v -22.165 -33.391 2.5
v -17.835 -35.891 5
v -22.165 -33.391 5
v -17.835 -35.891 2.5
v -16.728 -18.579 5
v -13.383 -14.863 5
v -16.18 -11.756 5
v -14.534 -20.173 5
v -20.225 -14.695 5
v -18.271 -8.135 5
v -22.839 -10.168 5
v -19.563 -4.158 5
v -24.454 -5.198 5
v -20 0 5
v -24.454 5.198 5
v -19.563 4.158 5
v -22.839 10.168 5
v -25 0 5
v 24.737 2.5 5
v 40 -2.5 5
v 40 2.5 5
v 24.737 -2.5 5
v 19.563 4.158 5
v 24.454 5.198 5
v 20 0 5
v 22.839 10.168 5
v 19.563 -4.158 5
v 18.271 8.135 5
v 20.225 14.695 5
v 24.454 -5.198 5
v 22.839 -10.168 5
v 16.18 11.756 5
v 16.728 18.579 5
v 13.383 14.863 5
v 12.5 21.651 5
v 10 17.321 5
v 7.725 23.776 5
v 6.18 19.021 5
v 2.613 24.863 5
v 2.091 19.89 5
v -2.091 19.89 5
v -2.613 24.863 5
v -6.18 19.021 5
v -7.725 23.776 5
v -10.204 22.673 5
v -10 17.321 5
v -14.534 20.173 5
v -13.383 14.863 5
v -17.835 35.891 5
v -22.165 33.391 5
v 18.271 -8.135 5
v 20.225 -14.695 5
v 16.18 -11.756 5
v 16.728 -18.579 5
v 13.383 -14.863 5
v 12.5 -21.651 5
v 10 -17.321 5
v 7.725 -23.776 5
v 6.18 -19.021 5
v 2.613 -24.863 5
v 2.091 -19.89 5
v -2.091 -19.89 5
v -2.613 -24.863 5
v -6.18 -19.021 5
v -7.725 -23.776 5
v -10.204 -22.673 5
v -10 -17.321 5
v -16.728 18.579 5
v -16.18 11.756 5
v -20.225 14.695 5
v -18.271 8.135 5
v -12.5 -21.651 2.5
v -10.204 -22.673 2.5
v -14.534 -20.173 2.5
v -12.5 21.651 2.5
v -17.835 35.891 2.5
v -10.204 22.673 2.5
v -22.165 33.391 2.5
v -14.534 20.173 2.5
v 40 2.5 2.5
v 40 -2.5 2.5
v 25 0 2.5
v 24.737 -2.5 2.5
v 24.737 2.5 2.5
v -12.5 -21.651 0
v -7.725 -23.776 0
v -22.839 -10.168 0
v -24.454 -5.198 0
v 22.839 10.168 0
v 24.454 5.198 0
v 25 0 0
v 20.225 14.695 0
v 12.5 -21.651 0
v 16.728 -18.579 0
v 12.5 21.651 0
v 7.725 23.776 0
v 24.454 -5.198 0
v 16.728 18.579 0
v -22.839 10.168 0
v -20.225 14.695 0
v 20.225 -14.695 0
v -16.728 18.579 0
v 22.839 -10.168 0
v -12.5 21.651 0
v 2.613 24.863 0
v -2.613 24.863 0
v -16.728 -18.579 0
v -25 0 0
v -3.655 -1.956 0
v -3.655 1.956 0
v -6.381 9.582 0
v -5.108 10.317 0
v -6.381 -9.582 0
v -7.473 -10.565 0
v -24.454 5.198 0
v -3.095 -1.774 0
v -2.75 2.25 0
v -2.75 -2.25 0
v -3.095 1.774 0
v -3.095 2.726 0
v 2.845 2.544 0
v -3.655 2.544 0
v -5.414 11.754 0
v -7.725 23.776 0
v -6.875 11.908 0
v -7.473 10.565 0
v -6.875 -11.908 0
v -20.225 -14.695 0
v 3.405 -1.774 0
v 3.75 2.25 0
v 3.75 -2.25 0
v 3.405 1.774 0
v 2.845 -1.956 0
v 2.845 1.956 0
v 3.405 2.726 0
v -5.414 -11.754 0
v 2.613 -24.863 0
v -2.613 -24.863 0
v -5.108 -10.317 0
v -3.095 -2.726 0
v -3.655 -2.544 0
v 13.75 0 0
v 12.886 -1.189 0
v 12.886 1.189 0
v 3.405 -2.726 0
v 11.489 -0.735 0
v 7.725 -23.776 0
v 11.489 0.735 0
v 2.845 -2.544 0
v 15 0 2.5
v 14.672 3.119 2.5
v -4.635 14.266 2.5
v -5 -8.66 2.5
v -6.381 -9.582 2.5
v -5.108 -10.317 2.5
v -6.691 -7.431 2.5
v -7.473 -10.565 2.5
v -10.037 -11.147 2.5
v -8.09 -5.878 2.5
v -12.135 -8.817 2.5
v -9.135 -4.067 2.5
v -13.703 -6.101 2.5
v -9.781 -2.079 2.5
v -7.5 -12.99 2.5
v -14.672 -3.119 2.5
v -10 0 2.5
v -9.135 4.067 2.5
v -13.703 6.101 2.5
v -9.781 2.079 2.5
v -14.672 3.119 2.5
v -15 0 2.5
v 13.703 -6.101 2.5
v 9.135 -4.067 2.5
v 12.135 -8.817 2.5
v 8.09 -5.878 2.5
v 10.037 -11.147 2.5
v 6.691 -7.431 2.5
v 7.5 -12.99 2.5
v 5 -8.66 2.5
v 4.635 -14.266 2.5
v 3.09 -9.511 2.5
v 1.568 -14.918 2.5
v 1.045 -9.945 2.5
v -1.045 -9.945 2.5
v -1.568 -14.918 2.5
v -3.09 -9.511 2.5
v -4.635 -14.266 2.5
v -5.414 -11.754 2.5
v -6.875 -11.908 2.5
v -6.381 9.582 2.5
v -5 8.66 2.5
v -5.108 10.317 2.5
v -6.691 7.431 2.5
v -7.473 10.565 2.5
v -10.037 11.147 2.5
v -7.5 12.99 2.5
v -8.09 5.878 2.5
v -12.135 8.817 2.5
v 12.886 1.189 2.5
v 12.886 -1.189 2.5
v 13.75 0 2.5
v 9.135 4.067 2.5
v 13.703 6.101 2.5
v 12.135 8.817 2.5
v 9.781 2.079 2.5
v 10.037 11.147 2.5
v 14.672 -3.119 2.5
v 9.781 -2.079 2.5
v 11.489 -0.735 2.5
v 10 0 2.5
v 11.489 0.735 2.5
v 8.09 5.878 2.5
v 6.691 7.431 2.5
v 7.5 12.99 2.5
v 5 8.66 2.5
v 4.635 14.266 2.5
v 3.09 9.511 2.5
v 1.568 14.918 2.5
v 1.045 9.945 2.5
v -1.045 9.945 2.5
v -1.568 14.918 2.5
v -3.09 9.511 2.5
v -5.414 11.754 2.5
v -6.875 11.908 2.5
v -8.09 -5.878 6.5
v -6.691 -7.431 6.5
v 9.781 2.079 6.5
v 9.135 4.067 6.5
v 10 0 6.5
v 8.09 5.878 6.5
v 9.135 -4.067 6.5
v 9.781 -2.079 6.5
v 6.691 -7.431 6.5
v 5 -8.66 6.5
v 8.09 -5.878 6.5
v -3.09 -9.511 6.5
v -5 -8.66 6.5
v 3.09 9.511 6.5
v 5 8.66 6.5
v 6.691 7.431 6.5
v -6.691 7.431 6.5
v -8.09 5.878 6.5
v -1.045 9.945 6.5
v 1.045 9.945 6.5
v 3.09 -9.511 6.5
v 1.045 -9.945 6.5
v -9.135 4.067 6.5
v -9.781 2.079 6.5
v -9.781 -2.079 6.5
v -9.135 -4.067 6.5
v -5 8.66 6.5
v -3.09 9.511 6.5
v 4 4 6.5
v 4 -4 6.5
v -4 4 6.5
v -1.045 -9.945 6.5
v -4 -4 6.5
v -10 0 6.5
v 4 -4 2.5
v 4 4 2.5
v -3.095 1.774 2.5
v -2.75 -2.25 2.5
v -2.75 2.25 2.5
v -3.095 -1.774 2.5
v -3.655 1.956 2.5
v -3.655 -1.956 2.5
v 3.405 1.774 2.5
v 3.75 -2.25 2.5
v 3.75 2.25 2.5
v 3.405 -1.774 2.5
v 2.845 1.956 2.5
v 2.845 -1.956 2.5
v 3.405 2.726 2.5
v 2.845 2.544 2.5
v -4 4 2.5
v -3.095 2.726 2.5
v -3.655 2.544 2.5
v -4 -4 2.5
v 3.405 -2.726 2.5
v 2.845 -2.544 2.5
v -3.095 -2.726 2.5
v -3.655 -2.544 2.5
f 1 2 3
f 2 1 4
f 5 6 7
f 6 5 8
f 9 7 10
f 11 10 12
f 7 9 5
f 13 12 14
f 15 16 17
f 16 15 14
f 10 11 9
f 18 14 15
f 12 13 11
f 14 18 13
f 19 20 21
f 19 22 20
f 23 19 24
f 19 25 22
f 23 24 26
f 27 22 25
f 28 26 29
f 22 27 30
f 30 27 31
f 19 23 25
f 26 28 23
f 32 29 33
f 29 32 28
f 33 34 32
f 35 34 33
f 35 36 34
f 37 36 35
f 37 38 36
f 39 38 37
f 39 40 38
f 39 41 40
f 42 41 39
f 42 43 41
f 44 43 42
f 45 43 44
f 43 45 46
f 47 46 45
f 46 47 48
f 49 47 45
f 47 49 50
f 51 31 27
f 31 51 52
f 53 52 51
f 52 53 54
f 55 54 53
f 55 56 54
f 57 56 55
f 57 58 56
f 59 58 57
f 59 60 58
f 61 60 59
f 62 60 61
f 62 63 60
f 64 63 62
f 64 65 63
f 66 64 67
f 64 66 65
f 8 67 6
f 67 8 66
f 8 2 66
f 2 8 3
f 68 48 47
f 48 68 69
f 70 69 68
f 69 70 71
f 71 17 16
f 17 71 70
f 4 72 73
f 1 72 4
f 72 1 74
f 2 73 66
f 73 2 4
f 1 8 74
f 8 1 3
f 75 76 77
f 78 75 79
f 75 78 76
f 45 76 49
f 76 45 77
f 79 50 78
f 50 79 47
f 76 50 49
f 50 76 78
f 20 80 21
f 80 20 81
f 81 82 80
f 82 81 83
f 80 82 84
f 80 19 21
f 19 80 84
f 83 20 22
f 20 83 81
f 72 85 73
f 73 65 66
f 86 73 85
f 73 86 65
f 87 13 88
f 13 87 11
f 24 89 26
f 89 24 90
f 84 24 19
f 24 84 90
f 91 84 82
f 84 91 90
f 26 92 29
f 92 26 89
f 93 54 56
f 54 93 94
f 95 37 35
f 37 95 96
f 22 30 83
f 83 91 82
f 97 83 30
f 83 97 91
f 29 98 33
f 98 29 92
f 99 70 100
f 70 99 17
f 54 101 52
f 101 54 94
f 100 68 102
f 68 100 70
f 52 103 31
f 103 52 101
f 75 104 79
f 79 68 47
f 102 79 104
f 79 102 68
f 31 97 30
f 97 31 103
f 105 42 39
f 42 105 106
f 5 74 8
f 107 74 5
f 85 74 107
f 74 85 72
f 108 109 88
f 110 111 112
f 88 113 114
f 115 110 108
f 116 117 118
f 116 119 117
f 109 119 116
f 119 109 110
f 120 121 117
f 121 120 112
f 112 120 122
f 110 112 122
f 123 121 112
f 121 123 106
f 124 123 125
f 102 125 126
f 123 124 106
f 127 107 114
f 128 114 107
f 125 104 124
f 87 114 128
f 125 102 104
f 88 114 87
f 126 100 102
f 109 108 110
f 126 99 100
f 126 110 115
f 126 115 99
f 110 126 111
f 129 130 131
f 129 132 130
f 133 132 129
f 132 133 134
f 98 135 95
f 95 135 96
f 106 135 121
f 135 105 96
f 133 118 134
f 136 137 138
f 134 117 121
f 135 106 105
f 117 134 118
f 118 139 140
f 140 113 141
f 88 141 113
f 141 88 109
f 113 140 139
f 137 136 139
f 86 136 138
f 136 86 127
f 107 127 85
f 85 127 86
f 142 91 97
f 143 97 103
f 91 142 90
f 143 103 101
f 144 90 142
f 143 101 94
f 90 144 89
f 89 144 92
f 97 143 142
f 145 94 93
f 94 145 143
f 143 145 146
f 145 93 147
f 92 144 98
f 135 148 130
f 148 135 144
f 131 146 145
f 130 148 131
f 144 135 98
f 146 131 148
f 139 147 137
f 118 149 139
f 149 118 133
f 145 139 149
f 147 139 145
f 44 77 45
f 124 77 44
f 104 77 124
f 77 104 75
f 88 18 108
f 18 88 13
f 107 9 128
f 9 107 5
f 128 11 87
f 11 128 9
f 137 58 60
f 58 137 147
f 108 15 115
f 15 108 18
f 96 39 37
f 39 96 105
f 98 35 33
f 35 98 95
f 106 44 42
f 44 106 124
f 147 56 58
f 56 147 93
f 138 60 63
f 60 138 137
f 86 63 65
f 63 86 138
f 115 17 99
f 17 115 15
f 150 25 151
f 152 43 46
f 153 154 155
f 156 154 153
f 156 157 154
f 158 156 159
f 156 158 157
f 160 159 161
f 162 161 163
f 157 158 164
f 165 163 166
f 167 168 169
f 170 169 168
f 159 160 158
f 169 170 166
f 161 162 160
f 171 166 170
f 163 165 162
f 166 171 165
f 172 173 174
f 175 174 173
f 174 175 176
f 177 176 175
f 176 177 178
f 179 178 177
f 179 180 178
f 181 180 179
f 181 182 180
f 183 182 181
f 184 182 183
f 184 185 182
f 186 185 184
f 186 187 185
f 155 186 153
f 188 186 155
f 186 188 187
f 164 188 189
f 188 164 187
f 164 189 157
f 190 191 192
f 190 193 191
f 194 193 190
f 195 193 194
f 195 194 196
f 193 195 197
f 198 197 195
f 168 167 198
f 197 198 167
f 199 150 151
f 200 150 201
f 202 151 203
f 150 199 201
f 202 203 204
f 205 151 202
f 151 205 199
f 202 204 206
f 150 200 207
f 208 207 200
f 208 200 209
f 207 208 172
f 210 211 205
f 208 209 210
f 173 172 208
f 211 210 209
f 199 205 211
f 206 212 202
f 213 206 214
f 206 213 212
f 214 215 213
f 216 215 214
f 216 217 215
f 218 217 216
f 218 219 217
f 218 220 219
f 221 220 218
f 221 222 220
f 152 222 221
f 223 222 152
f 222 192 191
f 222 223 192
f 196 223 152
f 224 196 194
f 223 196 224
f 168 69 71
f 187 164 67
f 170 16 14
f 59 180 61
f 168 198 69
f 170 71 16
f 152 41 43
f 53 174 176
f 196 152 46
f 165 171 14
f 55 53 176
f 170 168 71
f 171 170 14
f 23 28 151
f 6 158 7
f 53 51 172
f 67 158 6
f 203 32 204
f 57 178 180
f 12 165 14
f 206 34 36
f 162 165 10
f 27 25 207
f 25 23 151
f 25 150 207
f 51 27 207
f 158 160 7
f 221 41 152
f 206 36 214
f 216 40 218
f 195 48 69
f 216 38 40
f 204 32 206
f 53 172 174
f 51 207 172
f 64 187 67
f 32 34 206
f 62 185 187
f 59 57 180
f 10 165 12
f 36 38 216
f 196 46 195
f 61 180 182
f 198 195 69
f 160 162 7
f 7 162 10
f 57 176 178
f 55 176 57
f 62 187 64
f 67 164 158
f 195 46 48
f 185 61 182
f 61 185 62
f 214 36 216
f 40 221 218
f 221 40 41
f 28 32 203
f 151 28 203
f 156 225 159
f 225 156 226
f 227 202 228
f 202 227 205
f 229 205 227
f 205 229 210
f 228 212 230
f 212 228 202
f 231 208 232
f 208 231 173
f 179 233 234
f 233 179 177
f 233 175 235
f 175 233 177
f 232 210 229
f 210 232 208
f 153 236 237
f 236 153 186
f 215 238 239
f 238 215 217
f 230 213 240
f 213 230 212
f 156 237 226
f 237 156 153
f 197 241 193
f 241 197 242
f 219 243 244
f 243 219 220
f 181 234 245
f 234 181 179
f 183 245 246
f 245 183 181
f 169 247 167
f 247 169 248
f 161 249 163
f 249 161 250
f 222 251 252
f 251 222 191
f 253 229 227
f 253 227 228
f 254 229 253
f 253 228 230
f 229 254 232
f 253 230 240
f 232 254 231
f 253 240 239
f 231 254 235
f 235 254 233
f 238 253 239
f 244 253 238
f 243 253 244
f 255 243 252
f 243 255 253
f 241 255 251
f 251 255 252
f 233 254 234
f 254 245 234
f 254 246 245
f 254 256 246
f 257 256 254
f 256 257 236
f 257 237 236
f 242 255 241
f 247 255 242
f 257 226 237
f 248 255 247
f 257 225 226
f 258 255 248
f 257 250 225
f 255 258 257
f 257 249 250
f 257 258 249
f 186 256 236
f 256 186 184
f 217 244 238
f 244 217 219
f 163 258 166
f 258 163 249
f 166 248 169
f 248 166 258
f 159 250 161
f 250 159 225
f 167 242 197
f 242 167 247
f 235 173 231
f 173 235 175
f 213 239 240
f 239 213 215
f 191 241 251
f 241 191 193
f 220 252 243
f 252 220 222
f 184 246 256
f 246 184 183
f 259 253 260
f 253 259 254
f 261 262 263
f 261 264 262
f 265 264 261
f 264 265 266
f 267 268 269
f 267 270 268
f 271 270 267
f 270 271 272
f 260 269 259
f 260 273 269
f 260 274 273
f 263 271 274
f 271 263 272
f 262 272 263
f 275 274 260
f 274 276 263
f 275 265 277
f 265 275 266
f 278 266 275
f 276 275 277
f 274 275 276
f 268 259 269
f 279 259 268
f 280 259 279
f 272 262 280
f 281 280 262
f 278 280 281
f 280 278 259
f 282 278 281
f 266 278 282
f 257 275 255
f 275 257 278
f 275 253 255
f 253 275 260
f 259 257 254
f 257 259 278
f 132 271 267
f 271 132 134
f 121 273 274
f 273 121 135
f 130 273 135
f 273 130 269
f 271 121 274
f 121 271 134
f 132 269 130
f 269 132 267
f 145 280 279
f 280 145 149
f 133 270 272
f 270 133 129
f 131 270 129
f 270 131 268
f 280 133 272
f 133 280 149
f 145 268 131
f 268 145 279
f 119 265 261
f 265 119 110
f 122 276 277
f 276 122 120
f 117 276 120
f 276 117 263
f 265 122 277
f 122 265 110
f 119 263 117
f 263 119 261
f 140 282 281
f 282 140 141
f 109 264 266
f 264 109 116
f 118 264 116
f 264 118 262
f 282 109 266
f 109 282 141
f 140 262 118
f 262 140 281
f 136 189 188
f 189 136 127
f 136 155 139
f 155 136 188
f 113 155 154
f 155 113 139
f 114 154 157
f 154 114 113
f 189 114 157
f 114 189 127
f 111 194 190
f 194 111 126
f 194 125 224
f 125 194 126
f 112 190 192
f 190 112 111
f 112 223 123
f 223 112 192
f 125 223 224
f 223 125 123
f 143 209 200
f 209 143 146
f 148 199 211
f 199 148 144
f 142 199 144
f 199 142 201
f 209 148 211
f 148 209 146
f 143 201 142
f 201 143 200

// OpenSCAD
Base_Height=2.5;
Base_Radius=25;
Wing_Height=2.5;
Wing_Length=20;
Wing_Width=5;
Sensor_Width=8;
Sensor_Height=4;

Top_Inner_Radius=20;
Bot_Inner_Radius=15;
Sensor_Area_Radius=10;

Sensor_Hole_X=3.25;
Sensor_Hole_Y=2.25;
Sensor_Hole_R=.5;

Wire_Hole_R=1.25;

difference(){

difference(){

union(){

difference(){

union(){

rotate([0,0,240])translate([Base_Radius-Wing_Width,-Wing_Width/2,Base_Height])cube([Wing_Length,Wing_Width,Wing_Height]);

rotate([0,0,120])translate([Base_Radius-Wing_Width,-Wing_Width/2,Base_Height])cube([Wing_Length,Wing_Width,Wing_Height]);

translate([Base_Radius-Wing_Width,-Wing_Width/2,Base_Height])cube([Wing_Length,Wing_Width,Wing_Height]);

cylinder(Base_Height+Wing_Height,Base_Radius,Base_Radius);

}

union(){

translate([0,0,Base_Height])cylinder(Wing_Height,Bot_Inner_Radius,Top_Inner_Radius);

translate([0,0,Base_Height+Wing_Height])cylinder(1,Top_Inner_Radius,Top_Inner_Radius);

}

}

translate([0,0,Base_Height])cylinder(Sensor_Height,Sensor_Area_Radius,Sensor_Area_Radius);

}

translate([-Sensor_Width/2,-Sensor_Width/2,Base_Height])cube([Sensor_Width,Sensor_Width,Sensor_Height+1]);

}

union(){

translate([Sensor_Hole_X,Sensor_Hole_Y,-1])cylinder(Base_Height+2,Sensor_Hole_R,Sensor_Hole_R);

translate([Sensor_Hole_X,-Sensor_Hole_Y,-1])cylinder(Base_Height+2,Sensor_Hole_R,Sensor_Hole_R);

translate([-Sensor_Hole_X,Sensor_Hole_Y,-1])cylinder(Base_Height+2,Sensor_Hole_R,Sensor_Hole_R);

translate([-Sensor_Hole_X,-Sensor_Hole_Y,-1])cylinder(Base_Height+2,Sensor_Hole_R,Sensor_Hole_R);

rotate([0,0,240])translate([Bot_Inner_Radius/2+Sensor_Area_Radius/2,0,-1])cylinder(Base_Height+2,Wire_Hole_R,Wire_Hole_R);

rotate([0,0,120])translate([Bot_Inner_Radius/2+Sensor_Area_Radius/2,0,-1])cylinder(Base_Height+2,Wire_Hole_R,Wire_Hole_R);

translate([Bot_Inner_Radius/2+Sensor_Area_Radius/2,0,-1])cylinder(Base_Height+2,Wire_Hole_R,Wire_Hole_R);

}

}
